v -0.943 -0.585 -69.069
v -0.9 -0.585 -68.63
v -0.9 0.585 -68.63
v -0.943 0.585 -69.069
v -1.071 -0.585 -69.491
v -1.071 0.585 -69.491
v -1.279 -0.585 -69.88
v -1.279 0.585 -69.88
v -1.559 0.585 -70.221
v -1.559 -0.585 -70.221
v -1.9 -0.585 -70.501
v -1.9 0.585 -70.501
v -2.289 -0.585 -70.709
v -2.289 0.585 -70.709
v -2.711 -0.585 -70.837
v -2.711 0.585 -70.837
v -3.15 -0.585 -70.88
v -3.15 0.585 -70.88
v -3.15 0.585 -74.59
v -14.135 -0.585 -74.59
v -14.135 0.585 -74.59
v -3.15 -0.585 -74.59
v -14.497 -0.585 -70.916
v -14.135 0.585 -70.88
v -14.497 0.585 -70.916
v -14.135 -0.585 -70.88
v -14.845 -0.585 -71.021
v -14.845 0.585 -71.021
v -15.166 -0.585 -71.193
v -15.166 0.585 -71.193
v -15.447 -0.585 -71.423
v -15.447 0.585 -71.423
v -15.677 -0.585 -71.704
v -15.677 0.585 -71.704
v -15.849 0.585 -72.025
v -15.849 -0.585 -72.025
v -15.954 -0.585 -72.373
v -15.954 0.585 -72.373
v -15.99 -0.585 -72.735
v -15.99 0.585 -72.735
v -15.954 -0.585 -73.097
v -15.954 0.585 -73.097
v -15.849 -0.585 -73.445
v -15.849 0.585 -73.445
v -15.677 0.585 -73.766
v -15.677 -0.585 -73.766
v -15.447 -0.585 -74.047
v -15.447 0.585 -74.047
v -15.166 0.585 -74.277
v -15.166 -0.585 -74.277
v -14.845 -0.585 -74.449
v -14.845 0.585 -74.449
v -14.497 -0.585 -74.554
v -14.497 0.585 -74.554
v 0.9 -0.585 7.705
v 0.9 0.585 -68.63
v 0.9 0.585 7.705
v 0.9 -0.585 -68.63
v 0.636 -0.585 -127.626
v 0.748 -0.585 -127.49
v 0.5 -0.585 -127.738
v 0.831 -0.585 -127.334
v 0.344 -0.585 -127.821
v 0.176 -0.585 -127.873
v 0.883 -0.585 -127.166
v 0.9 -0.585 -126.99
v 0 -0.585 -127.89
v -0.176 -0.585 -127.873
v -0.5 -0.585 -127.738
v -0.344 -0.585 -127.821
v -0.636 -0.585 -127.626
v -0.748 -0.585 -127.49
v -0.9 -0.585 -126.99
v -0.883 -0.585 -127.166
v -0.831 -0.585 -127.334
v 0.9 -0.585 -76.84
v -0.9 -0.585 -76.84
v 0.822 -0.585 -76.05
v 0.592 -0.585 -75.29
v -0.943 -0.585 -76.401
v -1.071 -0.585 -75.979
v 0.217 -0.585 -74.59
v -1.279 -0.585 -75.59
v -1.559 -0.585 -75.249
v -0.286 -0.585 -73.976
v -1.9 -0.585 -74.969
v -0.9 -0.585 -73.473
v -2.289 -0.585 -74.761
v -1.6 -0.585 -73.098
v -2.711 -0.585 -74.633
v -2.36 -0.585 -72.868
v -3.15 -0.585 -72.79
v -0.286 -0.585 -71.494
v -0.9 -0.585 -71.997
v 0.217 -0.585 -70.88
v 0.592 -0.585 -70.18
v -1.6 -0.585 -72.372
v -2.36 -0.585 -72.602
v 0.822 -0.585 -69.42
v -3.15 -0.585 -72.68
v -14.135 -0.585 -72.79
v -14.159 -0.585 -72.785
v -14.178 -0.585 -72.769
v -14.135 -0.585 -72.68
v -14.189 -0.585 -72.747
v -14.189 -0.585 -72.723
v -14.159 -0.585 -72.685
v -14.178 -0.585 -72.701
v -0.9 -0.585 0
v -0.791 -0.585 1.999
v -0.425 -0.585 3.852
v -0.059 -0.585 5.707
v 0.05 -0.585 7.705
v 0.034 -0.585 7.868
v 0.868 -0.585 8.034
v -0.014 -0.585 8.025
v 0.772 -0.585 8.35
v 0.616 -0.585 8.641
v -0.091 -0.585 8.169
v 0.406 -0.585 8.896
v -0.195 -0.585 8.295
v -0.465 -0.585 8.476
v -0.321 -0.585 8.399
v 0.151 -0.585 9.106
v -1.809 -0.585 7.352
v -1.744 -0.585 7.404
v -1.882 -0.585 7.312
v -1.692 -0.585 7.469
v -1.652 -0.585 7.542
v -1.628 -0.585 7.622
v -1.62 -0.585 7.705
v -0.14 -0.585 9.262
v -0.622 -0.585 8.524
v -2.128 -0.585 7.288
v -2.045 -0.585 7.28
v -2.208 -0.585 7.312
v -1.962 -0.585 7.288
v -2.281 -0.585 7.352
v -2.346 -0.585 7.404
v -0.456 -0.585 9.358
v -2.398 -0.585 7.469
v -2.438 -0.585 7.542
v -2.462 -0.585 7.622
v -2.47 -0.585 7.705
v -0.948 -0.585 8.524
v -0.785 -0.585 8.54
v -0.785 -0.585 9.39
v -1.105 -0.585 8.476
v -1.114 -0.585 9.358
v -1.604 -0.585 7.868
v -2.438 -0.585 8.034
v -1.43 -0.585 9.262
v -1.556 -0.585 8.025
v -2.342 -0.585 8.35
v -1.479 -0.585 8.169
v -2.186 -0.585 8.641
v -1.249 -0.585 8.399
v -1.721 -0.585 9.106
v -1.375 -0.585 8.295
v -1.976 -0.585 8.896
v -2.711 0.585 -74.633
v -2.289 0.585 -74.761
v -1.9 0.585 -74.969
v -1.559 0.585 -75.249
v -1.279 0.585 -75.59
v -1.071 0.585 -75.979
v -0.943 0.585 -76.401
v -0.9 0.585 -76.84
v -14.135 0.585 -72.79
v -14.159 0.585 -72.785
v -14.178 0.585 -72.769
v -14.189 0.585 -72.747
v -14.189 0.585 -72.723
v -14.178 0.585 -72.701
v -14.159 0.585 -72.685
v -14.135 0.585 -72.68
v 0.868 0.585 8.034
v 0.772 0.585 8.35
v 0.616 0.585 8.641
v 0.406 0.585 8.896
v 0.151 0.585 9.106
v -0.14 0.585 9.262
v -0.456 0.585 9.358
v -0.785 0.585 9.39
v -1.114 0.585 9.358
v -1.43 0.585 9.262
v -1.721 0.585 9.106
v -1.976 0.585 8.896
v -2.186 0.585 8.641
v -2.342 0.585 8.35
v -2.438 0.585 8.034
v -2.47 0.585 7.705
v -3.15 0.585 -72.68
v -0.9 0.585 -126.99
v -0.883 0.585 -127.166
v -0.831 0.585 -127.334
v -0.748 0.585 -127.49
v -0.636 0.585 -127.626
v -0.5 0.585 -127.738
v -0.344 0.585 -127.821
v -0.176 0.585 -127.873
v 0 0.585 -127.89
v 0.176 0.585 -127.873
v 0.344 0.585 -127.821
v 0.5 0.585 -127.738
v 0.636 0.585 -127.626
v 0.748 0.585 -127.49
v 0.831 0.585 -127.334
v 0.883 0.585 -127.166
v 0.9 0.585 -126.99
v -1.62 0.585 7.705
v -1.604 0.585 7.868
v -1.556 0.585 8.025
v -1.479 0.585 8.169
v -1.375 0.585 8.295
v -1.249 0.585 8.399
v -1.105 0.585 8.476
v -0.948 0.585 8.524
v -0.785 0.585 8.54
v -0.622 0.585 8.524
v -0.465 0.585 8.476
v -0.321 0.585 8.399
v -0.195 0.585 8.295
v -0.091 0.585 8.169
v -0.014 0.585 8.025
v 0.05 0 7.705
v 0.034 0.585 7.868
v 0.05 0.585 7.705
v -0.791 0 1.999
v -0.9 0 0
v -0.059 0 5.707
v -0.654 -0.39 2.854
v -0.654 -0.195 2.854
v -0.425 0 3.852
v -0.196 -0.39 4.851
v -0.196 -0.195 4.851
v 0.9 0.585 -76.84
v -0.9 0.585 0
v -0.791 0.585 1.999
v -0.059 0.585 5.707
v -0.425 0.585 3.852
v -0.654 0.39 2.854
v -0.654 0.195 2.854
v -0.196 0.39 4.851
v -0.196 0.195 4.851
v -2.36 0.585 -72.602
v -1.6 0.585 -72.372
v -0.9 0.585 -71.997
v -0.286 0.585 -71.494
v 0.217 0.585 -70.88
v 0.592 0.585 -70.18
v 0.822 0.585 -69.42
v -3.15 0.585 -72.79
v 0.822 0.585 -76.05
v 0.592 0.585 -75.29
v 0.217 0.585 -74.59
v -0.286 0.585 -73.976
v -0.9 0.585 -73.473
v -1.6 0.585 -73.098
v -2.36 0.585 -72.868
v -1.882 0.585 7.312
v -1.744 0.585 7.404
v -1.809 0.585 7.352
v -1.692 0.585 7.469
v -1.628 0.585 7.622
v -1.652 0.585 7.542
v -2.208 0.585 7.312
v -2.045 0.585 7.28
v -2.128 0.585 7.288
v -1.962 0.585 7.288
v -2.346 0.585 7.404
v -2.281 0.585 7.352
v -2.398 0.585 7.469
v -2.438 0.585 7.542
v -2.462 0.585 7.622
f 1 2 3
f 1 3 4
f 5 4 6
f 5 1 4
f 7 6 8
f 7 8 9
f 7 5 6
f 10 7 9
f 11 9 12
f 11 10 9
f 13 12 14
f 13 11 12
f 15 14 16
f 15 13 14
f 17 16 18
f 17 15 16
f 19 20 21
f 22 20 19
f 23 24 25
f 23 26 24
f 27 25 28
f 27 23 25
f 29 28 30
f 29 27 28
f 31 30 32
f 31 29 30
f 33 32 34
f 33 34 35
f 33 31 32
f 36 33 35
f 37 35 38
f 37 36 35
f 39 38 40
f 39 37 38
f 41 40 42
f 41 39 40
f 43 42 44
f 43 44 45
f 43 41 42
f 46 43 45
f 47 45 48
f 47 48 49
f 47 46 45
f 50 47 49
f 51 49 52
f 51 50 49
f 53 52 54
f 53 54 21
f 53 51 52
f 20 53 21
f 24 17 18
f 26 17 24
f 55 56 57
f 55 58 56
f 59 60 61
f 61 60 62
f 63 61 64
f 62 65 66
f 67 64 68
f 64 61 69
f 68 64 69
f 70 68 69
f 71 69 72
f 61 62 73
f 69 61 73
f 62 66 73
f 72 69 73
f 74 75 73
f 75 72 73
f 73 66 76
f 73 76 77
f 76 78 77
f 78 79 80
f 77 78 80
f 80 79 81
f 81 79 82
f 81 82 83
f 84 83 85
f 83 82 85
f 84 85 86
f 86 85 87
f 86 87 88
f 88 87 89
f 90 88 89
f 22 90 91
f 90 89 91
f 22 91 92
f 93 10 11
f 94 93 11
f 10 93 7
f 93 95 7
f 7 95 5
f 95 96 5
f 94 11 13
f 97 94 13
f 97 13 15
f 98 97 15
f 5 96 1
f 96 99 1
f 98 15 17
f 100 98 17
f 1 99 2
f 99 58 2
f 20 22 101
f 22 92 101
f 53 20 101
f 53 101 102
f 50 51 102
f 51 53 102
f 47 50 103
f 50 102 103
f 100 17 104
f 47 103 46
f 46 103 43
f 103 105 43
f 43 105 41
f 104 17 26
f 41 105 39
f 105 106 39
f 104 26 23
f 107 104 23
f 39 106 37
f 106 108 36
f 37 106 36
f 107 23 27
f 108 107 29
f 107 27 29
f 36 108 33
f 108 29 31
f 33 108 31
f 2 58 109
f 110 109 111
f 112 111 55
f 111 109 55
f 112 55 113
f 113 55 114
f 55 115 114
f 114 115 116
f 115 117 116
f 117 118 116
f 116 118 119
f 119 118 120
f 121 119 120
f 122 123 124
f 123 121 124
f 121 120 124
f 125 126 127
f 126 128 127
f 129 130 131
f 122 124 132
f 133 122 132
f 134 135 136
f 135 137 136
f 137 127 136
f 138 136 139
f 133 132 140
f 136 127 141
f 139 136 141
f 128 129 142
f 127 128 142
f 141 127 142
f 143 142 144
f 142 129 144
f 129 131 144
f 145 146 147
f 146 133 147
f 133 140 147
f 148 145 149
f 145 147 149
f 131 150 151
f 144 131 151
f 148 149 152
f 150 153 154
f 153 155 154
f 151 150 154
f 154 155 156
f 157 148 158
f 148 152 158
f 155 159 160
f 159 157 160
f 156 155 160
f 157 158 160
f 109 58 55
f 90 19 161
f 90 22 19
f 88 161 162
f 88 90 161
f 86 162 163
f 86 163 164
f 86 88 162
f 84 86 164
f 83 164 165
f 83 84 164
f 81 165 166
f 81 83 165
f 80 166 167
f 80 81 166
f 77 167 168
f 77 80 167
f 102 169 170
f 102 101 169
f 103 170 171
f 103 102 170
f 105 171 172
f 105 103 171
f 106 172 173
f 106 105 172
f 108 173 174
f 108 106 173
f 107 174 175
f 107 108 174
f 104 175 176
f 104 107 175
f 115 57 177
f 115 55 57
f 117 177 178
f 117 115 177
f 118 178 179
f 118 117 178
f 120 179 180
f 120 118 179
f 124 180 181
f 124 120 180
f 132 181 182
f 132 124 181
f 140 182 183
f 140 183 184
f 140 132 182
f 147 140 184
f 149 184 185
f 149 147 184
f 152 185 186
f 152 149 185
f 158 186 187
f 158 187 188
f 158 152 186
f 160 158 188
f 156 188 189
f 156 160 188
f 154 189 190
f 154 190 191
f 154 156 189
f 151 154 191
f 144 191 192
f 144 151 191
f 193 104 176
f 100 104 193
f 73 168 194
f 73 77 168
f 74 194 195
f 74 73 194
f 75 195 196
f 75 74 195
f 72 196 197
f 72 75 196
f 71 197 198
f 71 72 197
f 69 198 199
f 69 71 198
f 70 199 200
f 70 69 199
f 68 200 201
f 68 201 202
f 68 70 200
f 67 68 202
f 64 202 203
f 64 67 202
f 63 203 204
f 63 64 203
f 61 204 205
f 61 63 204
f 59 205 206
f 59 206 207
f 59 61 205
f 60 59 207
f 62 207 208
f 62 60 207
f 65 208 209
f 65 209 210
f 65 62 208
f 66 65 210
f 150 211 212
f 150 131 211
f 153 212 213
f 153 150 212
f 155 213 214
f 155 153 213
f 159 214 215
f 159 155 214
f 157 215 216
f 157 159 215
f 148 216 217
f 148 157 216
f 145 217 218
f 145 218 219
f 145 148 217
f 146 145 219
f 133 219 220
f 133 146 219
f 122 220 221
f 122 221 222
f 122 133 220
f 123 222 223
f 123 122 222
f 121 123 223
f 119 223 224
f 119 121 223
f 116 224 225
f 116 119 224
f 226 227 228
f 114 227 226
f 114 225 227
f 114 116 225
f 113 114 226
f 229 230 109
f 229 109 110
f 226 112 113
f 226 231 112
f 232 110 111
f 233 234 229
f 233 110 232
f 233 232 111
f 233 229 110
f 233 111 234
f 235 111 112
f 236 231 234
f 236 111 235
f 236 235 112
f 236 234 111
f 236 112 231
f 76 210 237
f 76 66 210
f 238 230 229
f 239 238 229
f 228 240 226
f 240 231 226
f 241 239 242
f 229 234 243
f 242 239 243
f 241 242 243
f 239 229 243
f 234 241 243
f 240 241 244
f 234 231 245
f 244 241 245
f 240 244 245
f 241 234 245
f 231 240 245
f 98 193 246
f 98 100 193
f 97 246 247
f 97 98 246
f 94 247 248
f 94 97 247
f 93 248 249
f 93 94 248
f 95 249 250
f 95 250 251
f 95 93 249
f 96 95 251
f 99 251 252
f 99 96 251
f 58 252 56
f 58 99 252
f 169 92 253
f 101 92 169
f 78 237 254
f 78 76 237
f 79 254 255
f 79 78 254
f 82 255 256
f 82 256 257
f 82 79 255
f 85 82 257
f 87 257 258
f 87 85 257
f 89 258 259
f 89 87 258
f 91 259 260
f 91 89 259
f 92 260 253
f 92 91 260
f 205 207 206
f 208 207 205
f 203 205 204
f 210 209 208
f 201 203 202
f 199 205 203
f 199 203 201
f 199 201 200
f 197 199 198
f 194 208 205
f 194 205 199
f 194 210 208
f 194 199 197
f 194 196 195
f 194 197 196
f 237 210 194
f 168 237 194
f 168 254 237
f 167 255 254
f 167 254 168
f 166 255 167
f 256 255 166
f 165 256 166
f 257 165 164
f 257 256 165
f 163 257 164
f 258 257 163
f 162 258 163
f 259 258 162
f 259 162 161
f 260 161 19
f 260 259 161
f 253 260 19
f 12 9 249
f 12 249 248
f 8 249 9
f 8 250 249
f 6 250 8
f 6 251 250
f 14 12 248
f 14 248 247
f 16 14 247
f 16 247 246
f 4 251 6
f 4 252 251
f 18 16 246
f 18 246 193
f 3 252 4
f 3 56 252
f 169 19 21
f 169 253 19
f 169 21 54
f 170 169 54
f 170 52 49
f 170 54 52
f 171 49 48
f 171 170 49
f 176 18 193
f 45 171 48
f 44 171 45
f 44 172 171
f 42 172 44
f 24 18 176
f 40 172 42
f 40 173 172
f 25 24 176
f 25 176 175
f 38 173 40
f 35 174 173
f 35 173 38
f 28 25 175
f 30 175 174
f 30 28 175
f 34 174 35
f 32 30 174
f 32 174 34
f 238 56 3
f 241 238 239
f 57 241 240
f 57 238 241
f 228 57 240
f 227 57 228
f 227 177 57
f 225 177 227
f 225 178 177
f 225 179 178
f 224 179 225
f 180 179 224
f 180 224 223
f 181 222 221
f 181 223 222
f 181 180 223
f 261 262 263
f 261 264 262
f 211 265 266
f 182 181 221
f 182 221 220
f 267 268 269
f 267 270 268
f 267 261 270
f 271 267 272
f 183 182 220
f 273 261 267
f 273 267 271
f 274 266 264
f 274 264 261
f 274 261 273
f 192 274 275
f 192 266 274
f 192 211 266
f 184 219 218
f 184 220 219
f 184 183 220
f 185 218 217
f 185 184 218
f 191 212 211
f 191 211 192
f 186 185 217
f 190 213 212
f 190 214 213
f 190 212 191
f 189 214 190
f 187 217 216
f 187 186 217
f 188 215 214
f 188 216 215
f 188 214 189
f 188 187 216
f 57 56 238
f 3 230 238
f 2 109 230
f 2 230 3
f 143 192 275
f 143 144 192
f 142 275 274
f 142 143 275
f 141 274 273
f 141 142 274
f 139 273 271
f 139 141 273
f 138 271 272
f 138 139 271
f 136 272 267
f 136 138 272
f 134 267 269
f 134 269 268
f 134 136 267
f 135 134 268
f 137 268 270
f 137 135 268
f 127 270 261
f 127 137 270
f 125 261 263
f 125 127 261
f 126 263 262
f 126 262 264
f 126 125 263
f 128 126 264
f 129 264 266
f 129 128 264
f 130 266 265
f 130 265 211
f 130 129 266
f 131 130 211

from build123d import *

# Parameters (mm, degrees)
F1_DEPTH = 0.585


with BuildPart() as f1:
    # F0 (on Front) → F1 (new body, symmetric)
    with BuildSketch(Plane.XZ):
        with BuildLine():
            add(Edge.make_bspline(
                [(-0.9, 0), (-0.9, 3.8525), (0.05, 3.8525), (0.05, 7.705)],
                knots=[0, 0, 0, 0, 7.763345, 7.763345, 7.763345, 7.763345], degree=3))
            Line((-0.9, 0), (-0.9, -13.695881))
            Line((-0.9, -13.695881), (-0.9, -68.63))
            ThreePointArc((-0.9, -68.63), (-1.55901, -70.22099), (-3.15, -70.88))
            Line((-3.15, -70.88), (-14.135, -70.88))
            ThreePointArc((-14.135, -70.88), (-15.99, -72.735), (-14.135, -74.59))
            Line((-14.135, -74.59), (-3.15, -74.59))
            ThreePointArc((-3.15, -74.59), (-1.55901, -75.24901), (-0.9, -76.84))
            Line((-0.9, -76.84), (-0.9, -126.99))
            ThreePointArc((-0.9, -126.99), (0, -127.89), (0.9, -126.99))
            Line((0.9, -126.99), (0.9, -76.84))
            ThreePointArc((0.9, -76.84), (-0.286218, -73.976218), (-3.15, -72.79))
            Line((-3.15, -72.79), (-14.135, -72.79))
            ThreePointArc((-14.135, -72.79), (-14.19, -72.735), (-14.135, -72.68))
            Line((-14.135, -72.68), (-3.15, -72.68))
            ThreePointArc((-3.15, -72.68), (-0.286218, -71.493782), (0.9, -68.63))
            Line((0.9, -68.63), (0.9, -13.775932))
            Line((0.9, -13.775932), (0.9, 0))
            Line((0.9, 0), (0.9, 7.705))
            ThreePointArc((0.9, 7.705), (-0.785, 9.39), (-2.47, 7.705))
            ThreePointArc((-2.47, 7.705), (-2.045, 7.28), (-1.62, 7.705))
            ThreePointArc((-1.62, 7.705), (-0.785, 8.54), (0.05, 7.705))
        make_face()
    extrude(amount=F1_DEPTH, both=True)


solid = f1.part
